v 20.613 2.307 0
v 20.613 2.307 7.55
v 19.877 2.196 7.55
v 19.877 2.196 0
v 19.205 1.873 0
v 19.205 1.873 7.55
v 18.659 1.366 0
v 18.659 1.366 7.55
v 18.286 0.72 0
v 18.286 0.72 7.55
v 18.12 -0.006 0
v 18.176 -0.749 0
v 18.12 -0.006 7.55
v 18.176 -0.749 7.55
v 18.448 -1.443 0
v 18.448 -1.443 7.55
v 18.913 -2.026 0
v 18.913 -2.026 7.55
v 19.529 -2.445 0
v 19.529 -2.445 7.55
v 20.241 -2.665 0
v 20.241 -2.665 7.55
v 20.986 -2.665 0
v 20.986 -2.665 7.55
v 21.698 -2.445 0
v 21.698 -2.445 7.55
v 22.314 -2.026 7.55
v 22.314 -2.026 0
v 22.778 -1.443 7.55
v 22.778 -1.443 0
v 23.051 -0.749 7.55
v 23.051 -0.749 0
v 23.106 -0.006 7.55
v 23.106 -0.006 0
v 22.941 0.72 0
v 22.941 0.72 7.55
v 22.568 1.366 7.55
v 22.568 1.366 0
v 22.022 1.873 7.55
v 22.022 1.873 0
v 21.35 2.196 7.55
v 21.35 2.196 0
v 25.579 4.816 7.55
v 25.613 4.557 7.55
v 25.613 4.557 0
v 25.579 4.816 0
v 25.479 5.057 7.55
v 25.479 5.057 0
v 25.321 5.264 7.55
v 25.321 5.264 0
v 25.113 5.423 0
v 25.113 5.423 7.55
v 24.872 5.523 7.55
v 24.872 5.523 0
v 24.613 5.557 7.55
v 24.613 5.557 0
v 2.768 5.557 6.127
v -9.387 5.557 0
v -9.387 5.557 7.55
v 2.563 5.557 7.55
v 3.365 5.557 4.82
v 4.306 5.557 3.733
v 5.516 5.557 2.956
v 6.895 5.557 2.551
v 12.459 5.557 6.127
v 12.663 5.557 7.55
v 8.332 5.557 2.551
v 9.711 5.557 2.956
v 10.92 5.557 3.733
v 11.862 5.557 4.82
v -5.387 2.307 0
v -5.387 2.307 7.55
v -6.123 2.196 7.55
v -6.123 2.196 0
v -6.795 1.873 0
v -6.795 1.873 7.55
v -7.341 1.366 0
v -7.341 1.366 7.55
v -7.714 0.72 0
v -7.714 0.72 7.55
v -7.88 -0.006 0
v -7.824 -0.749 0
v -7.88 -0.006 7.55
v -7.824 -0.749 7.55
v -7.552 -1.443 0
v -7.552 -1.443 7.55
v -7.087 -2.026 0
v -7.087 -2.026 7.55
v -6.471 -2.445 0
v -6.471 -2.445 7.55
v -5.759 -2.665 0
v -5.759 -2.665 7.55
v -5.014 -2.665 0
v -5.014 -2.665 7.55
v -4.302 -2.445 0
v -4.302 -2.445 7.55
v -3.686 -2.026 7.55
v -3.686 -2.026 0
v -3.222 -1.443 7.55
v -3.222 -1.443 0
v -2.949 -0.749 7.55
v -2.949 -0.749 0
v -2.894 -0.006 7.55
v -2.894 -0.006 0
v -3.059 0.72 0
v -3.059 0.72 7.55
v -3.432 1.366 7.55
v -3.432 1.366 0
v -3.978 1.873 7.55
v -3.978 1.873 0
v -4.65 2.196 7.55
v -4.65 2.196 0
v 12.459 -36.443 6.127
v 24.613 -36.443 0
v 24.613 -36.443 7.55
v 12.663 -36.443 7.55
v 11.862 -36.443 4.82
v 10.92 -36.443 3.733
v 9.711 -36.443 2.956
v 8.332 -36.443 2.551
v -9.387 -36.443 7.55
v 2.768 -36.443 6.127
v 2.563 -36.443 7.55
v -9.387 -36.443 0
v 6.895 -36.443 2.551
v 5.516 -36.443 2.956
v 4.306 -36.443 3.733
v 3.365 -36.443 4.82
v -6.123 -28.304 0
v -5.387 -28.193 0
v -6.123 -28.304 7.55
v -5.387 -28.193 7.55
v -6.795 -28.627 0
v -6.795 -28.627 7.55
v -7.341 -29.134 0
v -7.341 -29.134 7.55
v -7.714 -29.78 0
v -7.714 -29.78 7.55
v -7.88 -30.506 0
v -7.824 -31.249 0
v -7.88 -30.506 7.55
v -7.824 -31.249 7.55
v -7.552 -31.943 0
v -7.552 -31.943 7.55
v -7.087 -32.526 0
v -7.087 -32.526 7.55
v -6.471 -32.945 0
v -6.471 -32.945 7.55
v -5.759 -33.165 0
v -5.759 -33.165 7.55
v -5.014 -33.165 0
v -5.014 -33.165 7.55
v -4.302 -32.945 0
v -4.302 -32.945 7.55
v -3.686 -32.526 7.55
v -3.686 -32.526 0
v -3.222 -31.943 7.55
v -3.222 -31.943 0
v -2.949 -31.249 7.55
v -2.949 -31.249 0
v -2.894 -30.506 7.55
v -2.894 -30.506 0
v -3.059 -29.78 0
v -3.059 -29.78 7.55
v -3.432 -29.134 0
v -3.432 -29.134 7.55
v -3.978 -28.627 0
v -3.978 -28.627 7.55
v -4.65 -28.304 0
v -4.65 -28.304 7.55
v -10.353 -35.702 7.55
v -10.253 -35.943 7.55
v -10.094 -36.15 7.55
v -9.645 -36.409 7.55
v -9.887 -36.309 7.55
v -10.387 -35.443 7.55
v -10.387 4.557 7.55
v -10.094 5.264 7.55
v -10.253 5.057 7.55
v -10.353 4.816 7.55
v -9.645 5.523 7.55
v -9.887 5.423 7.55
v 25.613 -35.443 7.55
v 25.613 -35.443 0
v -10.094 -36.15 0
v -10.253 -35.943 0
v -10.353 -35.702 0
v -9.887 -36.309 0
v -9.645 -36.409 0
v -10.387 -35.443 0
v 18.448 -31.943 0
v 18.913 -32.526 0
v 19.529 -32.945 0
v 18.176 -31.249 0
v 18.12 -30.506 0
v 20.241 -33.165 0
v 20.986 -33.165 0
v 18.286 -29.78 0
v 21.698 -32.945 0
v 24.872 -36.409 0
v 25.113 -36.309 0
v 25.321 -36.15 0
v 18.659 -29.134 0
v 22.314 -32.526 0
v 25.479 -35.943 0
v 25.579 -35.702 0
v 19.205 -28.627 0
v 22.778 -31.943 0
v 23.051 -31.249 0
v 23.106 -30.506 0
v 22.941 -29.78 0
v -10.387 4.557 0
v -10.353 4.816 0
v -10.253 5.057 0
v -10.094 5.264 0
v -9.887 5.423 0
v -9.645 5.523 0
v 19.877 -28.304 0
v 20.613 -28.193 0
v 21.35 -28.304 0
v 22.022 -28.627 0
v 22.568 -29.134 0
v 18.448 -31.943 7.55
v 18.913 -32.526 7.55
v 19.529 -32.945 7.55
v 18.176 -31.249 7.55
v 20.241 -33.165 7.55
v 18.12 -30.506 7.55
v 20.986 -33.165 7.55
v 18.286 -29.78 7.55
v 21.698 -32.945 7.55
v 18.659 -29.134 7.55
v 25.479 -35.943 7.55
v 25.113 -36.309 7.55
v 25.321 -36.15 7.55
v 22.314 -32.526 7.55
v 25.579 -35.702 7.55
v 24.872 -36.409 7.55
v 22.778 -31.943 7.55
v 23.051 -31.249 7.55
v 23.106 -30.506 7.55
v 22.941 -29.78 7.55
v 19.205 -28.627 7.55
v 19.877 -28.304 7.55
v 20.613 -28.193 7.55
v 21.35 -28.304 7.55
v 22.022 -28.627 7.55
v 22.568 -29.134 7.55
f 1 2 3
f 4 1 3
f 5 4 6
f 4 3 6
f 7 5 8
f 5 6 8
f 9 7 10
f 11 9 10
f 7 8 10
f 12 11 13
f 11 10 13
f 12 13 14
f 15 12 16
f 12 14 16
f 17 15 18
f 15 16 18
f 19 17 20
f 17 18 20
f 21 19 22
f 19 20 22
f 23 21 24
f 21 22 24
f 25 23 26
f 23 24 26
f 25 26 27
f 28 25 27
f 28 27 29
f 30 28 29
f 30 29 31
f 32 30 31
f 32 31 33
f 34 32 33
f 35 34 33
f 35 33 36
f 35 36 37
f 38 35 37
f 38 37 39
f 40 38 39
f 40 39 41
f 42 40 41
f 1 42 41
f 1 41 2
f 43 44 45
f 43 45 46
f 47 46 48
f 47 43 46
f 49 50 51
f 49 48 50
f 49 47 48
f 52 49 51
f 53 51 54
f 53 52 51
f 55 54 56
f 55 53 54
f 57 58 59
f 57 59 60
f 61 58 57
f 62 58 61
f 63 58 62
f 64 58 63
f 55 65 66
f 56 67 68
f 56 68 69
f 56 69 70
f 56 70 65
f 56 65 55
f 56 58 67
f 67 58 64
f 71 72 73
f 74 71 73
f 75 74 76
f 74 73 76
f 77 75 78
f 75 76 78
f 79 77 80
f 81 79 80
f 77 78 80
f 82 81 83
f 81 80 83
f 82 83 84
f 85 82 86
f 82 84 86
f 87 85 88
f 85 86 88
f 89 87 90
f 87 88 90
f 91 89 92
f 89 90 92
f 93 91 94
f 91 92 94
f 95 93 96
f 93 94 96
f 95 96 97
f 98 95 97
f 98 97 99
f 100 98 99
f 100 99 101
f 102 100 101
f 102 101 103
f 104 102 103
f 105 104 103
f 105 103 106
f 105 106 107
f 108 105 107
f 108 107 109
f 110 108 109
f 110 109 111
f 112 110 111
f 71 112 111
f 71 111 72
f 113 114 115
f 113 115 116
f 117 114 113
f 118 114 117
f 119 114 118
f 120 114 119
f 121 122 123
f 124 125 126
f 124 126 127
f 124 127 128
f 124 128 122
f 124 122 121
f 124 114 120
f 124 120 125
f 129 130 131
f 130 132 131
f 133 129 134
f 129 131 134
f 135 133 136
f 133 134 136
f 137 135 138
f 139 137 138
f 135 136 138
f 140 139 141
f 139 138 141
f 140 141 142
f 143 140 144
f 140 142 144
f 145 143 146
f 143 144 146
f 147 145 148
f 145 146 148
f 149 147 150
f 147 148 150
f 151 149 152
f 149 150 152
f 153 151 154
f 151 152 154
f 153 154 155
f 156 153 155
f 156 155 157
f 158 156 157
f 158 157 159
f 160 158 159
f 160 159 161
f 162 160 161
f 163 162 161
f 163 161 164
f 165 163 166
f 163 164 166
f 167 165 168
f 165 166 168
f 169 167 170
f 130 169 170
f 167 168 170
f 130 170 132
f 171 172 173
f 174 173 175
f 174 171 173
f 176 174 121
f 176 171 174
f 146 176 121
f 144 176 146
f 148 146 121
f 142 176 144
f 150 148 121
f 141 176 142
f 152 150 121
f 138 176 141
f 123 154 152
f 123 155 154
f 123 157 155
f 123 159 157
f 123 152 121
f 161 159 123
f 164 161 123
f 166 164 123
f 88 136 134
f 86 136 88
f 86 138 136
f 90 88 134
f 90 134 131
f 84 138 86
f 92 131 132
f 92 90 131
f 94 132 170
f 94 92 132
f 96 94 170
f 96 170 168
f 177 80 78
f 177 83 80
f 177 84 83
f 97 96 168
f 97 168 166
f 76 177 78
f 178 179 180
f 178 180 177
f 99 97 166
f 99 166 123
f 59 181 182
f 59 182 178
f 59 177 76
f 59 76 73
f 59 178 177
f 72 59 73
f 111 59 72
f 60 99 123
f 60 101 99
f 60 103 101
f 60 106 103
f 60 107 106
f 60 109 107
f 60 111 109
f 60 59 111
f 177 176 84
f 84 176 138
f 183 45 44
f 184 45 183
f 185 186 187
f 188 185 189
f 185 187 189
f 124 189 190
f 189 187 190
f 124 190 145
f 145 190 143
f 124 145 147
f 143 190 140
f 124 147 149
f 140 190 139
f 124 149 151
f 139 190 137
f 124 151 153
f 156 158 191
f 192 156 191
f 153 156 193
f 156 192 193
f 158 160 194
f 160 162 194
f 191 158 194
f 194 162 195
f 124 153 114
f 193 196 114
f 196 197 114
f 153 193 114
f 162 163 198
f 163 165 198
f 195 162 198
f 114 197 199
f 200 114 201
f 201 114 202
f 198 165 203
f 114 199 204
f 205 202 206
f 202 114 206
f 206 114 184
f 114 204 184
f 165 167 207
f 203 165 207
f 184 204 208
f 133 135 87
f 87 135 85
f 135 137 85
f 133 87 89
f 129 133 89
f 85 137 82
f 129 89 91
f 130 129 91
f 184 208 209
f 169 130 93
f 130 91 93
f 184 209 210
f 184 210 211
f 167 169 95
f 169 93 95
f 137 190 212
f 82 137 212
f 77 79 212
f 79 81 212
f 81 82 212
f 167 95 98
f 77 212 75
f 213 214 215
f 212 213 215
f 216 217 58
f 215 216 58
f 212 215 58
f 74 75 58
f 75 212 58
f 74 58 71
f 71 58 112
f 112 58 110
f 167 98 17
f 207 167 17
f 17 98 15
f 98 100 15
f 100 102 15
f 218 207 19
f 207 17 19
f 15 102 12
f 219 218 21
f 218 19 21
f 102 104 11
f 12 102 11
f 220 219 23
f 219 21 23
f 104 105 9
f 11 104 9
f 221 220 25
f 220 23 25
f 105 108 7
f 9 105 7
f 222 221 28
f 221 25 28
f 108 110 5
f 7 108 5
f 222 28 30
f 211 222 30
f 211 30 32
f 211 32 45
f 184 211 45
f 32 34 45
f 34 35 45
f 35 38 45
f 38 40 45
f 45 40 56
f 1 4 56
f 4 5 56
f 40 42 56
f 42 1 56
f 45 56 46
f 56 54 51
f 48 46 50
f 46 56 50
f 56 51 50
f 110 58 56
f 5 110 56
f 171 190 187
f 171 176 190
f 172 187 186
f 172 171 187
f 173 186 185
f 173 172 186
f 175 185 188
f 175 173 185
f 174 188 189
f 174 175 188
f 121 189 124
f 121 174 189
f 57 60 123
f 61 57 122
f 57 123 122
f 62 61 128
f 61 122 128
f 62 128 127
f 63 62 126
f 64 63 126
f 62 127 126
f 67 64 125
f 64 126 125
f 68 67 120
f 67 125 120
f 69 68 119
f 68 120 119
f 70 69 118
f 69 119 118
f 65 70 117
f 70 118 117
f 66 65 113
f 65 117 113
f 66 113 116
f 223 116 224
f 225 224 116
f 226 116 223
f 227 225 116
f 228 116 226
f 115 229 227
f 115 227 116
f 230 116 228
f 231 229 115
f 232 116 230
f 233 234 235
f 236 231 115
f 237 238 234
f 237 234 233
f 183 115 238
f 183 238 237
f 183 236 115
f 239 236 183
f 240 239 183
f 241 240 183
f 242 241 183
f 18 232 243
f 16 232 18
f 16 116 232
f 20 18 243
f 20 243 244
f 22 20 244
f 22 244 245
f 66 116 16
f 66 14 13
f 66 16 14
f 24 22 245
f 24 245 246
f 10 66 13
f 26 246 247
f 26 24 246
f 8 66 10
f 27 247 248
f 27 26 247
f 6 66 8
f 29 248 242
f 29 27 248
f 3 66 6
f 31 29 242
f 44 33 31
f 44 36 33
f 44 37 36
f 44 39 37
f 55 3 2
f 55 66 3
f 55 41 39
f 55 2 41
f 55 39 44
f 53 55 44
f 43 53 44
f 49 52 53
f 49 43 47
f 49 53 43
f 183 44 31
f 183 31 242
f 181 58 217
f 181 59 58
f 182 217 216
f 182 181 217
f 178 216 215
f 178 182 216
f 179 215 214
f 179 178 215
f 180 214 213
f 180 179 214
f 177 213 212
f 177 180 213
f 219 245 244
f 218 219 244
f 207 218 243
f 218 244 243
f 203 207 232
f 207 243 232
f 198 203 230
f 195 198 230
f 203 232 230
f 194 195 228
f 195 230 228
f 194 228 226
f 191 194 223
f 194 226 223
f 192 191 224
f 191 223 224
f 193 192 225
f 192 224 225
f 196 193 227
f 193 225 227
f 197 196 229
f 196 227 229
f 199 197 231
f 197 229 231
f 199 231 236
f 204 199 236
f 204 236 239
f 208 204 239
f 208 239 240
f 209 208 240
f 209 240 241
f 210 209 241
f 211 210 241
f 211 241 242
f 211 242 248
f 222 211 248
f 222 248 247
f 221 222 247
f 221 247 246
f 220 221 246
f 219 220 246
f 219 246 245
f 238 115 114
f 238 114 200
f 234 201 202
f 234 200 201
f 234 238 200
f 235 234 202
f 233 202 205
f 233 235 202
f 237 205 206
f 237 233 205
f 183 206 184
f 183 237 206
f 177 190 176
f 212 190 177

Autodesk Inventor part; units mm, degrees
ref_plane "YZ Plane" through (0, 0, 0) normal (1, 0, 0) x (0, 1, 0)
ref_plane "XZ Plane" through (0, 0, 0) normal (0, 1, 0) x (-1, 0, 0)
ref_plane "XY Plane" through (0, 0, 0) normal (0, 0, 1) x (1, 0, 0)
sketch "Szkic1" plane through (0, 0, 0) normal (0, 0, 1) x (1, 0, 0)
  line L0 (-10.3866, 5.557) -> (25.6134, 5.557)
  line L1 (25.6134, 5.557) -> (25.6134, -36.443)
  line L2 (25.6134, -36.443) -> (-10.3866, -36.443)
  line L3 (-10.3866, -36.443) -> (-10.3866, 5.557)
  point P0 (0, 0)
  point P1 (20.6134, -0.193)
  point P2 (20.6134, -30.693)
  point P3 (-5.3866, -0.193)
  point P4 (-5.3866, -30.693)
  dimension "d0" = 36
  dimension "d1" = 42
  dimension "d2" = 5
  dimension "d3" = 5
  dimension "d4" = 5
  dimension "d5" = 5
  dimension "d6" = 5.75
  dimension "d7" = 5.75
  dimension "d8" = 5.75
  dimension "d9" = 5.75
extrude "Wyciągnięcie proste1" add sketch "Szkic1" along normal blind 7.55
hole "Otwór1" at (20.6134, -0.193, 0) at (20.6134, -30.693, 0) at (-5.3866, -0.193, 0) at (-5.3866, -30.693, 0) direction (0, 0, 1) diameter 5 end through all
sketch "Szkic2" plane through (-10.3866, -36.443, 0) normal (0, -1, 0) x (1, 0, 0)
  line L0 (36, 0) -> (0, 0) projected
  line L1 (36, 0) -> (36, 7.55) projected
  line L2 (0, 7.55) -> (36, 7.55) projected
  line L3 (0, 0) -> (0, 7.55) projected
  line L4 (36, 7.55) -> (0, 7.55) projected
  circle A0 centre (18, 7.55) radius 5.05
  point P0 (10.3866, 0)
  dimension "d19" = 36
  dimension "d20" = 18
  dimension "d21" = 10.1
extrude "Wyciągnięcie proste2" cut sketch "Szkic2" against normal through all contours A0 L2 | L2 A0
fillet "Zaokrąglenie1" radius 1 4 edges at (-10.3866, -36.443, 3.775) (-10.3866, 5.557, 3.775) (25.6134, -36.443, 3.775) (25.6134, 5.557, 3.775)
equation "\"d7\" = d6"
equation "\"d8\" = d7"
equation "\"d9\" = d6"
equation "\"d20\" = 0.5 * d19"
properties part number "3DP_ABS_X_Axis_Linear_Shaft_Clamp_Base"
